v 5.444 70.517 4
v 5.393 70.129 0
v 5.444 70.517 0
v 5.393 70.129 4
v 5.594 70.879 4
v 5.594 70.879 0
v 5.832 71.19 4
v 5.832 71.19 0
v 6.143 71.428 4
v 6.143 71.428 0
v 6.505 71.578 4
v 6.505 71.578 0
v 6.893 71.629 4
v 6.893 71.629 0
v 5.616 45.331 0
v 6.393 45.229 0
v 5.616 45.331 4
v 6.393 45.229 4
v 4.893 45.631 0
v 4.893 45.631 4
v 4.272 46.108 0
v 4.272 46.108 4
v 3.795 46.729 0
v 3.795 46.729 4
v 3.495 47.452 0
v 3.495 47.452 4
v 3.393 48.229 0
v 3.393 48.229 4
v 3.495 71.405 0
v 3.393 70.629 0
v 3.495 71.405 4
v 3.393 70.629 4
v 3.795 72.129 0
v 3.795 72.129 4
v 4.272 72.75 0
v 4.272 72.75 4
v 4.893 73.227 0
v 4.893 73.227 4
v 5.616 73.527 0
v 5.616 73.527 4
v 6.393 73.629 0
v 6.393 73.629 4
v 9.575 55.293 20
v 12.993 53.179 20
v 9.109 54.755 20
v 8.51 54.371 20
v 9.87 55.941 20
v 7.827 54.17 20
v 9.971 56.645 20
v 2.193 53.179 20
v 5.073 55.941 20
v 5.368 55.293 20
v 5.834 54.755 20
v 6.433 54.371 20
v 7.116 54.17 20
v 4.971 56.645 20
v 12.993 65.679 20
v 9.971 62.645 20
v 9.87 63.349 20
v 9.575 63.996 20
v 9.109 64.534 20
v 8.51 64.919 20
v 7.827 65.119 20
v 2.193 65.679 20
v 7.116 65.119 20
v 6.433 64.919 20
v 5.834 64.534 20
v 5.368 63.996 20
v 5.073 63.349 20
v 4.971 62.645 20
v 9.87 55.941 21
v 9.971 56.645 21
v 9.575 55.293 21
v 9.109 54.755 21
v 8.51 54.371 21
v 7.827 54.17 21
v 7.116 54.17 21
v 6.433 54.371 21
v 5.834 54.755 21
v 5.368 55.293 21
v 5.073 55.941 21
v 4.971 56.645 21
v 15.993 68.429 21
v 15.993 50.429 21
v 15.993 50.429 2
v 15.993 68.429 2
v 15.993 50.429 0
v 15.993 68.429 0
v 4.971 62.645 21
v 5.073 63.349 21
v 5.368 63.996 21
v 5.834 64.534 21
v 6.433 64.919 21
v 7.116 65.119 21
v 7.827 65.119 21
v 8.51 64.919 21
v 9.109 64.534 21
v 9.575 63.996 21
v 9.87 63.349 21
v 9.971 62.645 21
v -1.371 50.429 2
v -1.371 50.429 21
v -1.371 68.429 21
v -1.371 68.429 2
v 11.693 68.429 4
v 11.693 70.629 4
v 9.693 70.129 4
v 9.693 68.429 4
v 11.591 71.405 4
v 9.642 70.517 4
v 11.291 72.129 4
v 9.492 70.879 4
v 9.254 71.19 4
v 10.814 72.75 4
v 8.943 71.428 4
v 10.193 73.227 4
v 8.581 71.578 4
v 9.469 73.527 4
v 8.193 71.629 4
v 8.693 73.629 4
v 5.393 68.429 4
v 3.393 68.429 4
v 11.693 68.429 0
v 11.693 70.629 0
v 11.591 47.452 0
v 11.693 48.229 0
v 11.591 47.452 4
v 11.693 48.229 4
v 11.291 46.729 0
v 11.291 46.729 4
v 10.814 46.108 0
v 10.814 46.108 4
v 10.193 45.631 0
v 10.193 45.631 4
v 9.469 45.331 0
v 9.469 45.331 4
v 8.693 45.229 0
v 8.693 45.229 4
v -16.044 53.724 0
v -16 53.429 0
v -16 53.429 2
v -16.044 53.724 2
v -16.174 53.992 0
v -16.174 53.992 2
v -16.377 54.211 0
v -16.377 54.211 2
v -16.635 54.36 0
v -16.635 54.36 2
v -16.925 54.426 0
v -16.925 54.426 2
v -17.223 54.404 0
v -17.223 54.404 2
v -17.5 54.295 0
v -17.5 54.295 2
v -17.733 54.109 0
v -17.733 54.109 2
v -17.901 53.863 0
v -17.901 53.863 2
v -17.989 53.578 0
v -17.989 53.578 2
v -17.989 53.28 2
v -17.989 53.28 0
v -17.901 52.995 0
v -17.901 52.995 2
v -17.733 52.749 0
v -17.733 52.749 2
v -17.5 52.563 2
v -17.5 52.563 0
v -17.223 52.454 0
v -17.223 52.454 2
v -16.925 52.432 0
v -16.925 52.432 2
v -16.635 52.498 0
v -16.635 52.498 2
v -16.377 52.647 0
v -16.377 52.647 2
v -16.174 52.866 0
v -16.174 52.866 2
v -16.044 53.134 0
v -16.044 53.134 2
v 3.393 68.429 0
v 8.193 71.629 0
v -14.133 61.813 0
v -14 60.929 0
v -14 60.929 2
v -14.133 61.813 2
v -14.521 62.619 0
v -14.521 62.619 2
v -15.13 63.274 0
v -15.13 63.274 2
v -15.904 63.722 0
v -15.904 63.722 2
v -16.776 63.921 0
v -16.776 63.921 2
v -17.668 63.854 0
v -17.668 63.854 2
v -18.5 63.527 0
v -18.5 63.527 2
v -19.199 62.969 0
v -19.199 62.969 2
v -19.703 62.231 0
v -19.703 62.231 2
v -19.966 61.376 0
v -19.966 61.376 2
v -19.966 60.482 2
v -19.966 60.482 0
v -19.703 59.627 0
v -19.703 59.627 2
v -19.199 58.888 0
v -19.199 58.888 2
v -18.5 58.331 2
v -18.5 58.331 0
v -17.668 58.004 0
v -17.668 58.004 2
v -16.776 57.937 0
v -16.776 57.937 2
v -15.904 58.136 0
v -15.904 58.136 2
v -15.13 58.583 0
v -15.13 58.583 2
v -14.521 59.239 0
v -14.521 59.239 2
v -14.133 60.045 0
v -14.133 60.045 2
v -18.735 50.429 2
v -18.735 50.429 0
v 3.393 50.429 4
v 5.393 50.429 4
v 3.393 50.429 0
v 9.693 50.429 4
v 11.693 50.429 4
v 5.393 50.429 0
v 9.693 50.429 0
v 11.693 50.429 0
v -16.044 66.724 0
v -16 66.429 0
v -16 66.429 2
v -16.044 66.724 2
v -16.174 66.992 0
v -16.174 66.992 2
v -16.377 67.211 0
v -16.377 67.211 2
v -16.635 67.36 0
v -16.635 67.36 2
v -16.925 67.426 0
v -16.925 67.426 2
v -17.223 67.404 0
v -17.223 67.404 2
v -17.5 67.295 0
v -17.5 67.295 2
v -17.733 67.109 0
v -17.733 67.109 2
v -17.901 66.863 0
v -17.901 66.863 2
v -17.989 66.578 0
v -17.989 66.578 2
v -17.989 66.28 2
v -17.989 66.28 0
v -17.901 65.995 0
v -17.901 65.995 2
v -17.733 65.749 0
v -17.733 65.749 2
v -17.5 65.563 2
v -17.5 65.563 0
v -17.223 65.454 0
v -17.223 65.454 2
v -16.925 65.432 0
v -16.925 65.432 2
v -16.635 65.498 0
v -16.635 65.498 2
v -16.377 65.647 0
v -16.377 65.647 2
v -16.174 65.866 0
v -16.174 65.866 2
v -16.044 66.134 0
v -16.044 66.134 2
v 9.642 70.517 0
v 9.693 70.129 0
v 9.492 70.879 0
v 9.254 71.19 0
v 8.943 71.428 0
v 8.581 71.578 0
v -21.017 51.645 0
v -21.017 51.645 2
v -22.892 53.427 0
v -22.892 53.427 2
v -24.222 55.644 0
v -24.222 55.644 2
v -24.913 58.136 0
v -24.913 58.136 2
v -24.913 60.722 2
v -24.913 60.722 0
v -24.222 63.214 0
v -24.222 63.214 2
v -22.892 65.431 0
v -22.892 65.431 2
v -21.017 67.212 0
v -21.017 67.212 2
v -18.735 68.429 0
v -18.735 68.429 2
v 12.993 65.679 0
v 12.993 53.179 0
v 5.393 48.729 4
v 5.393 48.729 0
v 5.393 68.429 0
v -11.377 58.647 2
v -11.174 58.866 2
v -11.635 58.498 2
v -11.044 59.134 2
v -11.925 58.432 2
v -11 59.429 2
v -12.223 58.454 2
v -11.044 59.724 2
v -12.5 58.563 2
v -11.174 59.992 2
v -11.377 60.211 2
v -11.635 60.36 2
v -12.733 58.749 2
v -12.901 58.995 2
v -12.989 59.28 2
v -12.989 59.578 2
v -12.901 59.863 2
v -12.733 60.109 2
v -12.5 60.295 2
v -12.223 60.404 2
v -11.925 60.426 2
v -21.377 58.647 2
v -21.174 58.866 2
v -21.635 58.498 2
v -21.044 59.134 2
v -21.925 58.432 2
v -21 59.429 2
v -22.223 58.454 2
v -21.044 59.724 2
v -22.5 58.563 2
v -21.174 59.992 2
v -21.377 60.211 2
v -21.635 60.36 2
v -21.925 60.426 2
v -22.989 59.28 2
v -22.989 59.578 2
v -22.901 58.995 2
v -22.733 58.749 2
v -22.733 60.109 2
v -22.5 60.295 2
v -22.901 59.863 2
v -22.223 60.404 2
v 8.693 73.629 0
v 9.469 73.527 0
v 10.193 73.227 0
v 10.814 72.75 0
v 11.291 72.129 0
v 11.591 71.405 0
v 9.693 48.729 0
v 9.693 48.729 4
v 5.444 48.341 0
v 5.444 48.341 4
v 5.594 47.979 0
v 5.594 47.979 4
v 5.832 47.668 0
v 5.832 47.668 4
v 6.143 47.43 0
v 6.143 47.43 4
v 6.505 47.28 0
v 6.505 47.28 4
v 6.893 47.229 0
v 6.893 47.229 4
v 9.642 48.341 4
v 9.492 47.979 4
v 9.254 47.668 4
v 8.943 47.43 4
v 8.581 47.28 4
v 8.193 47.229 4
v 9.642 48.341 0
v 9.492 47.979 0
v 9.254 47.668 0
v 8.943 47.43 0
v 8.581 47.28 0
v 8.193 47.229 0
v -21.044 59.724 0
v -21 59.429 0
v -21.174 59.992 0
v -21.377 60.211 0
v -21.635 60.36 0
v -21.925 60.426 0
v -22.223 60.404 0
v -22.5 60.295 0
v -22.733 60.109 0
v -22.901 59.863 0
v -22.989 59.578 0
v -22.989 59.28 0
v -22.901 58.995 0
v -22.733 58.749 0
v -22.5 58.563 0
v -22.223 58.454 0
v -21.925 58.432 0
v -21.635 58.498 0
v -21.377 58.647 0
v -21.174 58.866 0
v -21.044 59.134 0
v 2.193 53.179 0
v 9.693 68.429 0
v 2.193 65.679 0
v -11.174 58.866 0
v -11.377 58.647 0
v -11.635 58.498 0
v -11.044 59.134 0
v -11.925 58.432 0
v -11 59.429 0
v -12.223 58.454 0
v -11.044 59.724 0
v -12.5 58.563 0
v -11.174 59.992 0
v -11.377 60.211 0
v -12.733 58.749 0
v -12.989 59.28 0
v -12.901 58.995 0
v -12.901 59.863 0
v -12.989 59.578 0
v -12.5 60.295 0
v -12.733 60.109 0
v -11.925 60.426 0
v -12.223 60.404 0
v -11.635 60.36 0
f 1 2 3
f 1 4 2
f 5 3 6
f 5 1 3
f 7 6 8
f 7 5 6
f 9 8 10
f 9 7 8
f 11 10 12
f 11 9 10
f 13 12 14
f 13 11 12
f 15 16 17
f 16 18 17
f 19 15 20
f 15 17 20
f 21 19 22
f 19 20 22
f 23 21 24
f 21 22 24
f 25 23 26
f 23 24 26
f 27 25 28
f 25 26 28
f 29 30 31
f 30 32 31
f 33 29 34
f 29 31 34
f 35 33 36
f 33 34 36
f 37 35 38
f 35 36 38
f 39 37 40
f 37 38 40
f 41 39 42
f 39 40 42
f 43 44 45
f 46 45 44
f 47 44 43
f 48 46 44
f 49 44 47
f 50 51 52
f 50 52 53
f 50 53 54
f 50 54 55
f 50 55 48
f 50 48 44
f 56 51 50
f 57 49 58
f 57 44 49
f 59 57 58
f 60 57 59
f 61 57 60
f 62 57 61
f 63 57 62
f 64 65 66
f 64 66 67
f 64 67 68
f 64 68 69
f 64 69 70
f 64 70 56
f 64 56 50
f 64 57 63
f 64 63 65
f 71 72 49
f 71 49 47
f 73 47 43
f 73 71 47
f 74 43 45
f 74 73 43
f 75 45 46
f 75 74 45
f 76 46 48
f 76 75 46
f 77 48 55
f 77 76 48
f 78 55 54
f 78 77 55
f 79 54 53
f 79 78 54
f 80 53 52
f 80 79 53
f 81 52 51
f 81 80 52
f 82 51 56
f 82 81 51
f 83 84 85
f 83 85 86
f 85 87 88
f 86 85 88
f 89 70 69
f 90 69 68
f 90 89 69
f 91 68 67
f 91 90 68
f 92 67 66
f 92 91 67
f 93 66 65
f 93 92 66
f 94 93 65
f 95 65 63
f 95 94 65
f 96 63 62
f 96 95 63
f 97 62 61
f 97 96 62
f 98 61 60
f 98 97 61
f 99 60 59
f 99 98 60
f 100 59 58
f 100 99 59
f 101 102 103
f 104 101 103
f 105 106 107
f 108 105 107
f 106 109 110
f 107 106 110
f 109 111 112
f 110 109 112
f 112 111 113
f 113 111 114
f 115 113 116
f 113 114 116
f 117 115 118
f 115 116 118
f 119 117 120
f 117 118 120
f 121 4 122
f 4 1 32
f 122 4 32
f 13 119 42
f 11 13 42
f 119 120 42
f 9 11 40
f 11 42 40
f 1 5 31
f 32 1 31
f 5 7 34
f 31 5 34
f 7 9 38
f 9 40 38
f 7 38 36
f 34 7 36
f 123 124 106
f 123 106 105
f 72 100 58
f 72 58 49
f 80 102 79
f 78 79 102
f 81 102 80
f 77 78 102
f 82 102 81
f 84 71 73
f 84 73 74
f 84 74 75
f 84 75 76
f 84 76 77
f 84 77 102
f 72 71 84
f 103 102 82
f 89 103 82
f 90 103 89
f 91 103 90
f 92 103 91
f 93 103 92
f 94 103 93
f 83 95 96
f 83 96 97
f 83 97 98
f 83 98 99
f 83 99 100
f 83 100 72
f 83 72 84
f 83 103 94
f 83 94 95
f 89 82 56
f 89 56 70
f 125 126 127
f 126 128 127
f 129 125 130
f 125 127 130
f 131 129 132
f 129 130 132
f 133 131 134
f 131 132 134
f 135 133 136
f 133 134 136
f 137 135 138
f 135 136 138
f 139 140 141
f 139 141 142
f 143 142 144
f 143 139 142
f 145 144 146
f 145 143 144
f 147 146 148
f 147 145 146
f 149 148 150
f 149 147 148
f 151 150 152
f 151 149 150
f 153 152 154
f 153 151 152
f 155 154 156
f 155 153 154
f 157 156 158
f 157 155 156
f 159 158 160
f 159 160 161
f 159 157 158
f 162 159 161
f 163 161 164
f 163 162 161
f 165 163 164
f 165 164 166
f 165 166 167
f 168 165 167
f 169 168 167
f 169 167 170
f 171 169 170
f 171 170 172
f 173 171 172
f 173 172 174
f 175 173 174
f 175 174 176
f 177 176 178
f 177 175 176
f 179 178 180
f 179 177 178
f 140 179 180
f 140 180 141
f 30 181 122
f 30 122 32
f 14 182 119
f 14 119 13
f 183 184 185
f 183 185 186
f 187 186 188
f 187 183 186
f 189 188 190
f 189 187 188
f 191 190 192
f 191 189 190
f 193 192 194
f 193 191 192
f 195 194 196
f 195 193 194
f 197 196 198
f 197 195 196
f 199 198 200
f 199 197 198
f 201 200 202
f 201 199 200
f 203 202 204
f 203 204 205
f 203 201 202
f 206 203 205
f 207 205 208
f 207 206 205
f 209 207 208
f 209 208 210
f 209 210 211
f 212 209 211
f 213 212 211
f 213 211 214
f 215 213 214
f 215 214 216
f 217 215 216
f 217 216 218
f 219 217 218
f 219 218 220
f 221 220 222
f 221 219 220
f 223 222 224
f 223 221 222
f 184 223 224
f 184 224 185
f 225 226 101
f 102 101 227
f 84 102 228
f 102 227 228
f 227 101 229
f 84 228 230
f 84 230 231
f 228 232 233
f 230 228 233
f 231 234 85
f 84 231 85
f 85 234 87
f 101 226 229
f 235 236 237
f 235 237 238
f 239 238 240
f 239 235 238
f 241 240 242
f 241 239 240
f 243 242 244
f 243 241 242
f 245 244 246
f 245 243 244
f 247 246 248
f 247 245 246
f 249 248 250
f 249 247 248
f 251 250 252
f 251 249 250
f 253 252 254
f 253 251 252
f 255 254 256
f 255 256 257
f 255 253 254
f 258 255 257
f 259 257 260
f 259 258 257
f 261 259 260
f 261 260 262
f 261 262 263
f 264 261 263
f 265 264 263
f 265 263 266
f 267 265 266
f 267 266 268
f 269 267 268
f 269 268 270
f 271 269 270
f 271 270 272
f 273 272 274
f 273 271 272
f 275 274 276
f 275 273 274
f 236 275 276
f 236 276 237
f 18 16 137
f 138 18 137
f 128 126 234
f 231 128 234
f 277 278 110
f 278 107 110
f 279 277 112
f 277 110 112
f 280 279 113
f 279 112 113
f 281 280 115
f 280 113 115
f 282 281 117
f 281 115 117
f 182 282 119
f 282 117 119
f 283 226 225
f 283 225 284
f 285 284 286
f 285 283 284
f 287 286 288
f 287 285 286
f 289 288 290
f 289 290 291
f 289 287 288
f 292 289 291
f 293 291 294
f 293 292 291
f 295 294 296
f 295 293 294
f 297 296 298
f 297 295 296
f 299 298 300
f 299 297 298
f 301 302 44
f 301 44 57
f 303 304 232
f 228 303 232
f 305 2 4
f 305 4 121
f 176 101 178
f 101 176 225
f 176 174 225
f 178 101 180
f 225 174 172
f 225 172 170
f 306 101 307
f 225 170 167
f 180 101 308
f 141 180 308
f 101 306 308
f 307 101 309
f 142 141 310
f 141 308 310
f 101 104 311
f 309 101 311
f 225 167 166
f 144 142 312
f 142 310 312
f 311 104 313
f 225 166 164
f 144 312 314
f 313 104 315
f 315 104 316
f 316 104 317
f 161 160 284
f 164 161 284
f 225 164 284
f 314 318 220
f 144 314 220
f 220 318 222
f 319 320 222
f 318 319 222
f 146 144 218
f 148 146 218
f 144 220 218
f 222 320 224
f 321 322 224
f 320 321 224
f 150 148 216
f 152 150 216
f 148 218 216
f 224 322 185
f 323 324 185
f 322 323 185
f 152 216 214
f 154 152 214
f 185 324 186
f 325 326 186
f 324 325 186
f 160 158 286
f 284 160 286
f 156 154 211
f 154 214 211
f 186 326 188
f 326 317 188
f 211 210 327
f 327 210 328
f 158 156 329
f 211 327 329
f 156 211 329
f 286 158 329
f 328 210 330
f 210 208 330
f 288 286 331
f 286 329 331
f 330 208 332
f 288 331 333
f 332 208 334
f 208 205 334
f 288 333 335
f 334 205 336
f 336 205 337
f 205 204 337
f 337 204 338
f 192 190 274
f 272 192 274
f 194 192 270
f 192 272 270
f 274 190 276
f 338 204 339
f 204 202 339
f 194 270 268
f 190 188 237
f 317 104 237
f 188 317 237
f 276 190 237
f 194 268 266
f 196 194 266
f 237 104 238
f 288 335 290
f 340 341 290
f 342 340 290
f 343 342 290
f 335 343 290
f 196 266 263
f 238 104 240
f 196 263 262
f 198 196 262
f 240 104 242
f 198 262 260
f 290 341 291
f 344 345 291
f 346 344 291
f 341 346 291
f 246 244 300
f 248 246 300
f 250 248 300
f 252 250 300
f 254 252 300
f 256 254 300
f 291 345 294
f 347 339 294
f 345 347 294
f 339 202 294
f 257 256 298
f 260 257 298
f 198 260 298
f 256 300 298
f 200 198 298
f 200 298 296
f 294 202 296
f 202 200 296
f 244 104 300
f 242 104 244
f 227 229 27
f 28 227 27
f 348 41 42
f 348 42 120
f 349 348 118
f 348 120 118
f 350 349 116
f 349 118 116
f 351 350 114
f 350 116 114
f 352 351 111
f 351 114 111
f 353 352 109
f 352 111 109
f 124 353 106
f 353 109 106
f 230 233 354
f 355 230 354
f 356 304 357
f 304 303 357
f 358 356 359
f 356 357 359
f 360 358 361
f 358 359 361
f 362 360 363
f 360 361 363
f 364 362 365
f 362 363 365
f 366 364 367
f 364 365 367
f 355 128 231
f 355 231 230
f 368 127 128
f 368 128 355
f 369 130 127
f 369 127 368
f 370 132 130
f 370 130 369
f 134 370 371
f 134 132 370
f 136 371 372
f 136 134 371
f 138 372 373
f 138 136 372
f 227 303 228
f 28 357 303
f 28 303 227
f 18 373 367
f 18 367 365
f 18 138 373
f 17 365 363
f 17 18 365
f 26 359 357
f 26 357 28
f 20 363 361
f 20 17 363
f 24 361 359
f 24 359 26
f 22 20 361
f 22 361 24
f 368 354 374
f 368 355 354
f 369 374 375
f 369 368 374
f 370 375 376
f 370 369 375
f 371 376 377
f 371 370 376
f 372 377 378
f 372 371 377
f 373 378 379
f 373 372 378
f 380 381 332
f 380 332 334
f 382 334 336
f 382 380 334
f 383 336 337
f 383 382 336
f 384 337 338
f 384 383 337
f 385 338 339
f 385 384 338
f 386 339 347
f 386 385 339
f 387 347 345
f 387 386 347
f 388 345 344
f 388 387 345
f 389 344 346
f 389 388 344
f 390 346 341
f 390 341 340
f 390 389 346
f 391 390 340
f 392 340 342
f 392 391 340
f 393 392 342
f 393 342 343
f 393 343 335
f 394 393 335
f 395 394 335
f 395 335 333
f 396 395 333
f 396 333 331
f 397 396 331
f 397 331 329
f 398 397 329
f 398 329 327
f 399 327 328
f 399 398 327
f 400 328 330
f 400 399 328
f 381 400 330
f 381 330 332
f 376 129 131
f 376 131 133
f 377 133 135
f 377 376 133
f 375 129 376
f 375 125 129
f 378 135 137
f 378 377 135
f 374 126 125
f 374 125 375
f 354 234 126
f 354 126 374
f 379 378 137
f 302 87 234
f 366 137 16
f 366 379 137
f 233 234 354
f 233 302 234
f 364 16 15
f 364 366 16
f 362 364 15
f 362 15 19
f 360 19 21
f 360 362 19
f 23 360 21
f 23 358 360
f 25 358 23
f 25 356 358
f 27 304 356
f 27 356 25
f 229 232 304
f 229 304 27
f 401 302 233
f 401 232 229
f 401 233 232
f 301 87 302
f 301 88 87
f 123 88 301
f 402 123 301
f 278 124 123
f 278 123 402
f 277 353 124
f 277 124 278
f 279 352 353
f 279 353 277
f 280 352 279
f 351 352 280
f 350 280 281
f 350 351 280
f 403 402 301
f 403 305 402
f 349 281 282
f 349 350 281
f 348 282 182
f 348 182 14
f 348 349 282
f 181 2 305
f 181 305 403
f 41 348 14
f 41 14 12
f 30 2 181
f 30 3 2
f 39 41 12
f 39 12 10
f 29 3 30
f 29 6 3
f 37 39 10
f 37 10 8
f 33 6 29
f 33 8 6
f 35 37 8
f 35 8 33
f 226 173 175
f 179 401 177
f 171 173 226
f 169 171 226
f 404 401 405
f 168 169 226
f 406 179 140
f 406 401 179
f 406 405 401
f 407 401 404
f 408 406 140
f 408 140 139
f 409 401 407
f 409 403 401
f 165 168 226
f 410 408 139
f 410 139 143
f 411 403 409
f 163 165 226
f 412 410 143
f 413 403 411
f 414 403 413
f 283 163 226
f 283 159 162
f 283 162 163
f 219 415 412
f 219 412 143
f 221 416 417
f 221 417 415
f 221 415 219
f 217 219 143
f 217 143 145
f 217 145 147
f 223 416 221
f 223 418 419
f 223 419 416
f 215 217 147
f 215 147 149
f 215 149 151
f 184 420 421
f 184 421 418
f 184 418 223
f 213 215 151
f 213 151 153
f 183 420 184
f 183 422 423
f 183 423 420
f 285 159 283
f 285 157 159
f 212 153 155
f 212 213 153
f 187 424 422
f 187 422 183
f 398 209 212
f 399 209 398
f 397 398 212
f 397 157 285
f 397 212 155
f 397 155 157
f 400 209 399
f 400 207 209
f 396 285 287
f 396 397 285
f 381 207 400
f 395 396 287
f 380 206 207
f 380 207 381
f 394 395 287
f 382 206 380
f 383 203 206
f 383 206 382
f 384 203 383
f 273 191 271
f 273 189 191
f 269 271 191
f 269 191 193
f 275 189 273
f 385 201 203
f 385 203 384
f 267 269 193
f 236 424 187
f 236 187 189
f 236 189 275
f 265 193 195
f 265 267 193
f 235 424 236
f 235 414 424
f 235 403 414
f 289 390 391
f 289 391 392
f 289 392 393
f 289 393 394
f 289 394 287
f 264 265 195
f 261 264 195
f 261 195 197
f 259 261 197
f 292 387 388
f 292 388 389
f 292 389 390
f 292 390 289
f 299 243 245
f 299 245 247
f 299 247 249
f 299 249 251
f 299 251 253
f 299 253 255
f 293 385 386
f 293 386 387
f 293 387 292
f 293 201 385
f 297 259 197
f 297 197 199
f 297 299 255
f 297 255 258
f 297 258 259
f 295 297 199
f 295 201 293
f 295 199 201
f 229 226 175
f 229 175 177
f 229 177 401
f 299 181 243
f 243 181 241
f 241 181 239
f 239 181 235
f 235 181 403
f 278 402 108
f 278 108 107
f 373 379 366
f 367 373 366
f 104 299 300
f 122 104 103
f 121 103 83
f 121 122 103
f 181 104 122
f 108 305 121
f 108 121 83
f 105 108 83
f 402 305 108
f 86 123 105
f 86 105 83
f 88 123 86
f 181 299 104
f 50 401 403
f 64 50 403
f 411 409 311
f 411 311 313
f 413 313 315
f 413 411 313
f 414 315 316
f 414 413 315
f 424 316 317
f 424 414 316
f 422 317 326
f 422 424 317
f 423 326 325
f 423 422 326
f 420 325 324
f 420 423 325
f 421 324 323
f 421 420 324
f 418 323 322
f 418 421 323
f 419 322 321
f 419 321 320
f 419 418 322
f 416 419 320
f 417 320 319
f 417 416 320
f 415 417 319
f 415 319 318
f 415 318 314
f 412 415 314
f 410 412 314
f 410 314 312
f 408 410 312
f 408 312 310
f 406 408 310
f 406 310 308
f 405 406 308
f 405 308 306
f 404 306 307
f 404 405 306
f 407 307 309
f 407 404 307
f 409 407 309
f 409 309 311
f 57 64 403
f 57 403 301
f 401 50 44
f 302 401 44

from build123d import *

# Parameters (mm, degrees)
SKETCH2_R            = 1
SKETCH2_R_2          = 3
BOSS_EXTRUDE2_DEPTH  = 2
SKETCH3_W            = 10.8
SKETCH3_H            = 12.5
CUT_EXTRUDE1_DEPTH   = 3
SKETCH4_W            = 17.364181201
SKETCH4_H            = 18
BOSS_EXTRUDE3_DEPTH  = 19
SKETCH5_W            = 10.8
SKETCH5_H            = 12.5
CUT_EXTRUDE2_DEPTH   = 18
BOSS_EXTRUDE4_DEPTH  = 4
FILLET1_R            = 1.5
FILLET2_R            = 3
FILLET1_OF_MIRROR1_R = 1.5
FILLET2_OF_MIRROR1_R = 3
CUT_EXTRUDE3_DEPTH   = 10


with BuildPart() as part:
    # Sketch2 → Boss-Extrude2 (new body)
    with BuildSketch(Plane.XY):
        with BuildLine():
            Line((-18.735484911, 68.428926153), (15.992877491, 68.428926153))
            Line((15.992877491, 68.428926153), (15.992877491, 50.428926153))
            Line((15.992877491, 50.428926153), (-18.735484911, 50.428926153))
            ThreePointArc((-18.735484911, 50.428926153), (-25.000050177, 59.428926153), (-18.735484911, 68.428926153))
        make_face()
        with Locations((-17, 53.428926153)):
            Circle(SKETCH2_R, mode=Mode.SUBTRACT)
        with Locations((-17, 60.928926153)):
            Circle(SKETCH2_R_2, mode=Mode.SUBTRACT)
        with Locations((-22, 59.428926153)):
            Circle(SKETCH2_R, mode=Mode.SUBTRACT)
        with Locations((-17, 66.428926153)):
            Circle(SKETCH2_R, mode=Mode.SUBTRACT)
        with Locations((-12, 59.428926153)):
            Circle(SKETCH2_R, mode=Mode.SUBTRACT)
    extrude(amount=BOSS_EXTRUDE2_DEPTH)

    # Sketch3 → Cut-Extrude1 (cut, through all)
    with BuildSketch(Plane.XY.offset(2)):
        with Locations((7.592877491, 59.428926153)):
            Rectangle(SKETCH3_W, SKETCH3_H)
    extrude(amount=-CUT_EXTRUDE1_DEPTH, mode=Mode.SUBTRACT)

    # Sketch4 → Boss-Extrude3 (add)
    with BuildSketch(Plane.XY.offset(2)):
        with Locations((7.310786891, 59.428926153)):
            Rectangle(SKETCH4_W, SKETCH4_H)
    extrude(amount=BOSS_EXTRUDE3_DEPTH)

    # Sketch5 → Cut-Extrude2 (cut)
    with BuildSketch(Plane(origin=(0, 0, 2), x_dir=(-1, 0, 0), z_dir=(0, 0, -1))):
        with Locations((-7.592877491, 59.428926153)):
            Rectangle(SKETCH5_W, SKETCH5_H)
    extrude(amount=-CUT_EXTRUDE2_DEPTH, mode=Mode.SUBTRACT)

    # Sketch7 → Boss-Extrude4 (add)
    with BuildSketch(Plane(origin=(0, 0, 0), x_dir=(-1, 0, 0), z_dir=(0, 0, -1))):
        Polygon((-11.692877491, 68.428926153), (-9.692877491, 68.428926153), (-9.692877491, 71.628926153), (-5.392877491, 71.628926153), (-5.392877491, 68.428926153), (-3.392877491, 68.428926153), (-3.392877491, 73.628926153), (-11.692877491, 73.628926153), align=None)
    boss_extrude4 = extrude(amount=-BOSS_EXTRUDE4_DEPTH)

    # Fillet1
    fillet1_edges = [part.edges().sort_by_distance(p)[0] for p in [
        (5.392877491, 71.628926153, 2),
        (9.692877491, 71.628926153, 2),
    ]]
    fillet(fillet1_edges, radius=FILLET1_R)

    # Fillet2
    fillet2_edges = [part.edges().sort_by_distance(p)[0] for p in [
        (3.392877491, 73.628926153, 2),
        (11.692877491, 73.628926153, 2),
    ]]
    fillet(fillet2_edges, radius=FILLET2_R)

    # Mirror1: Boss-Extrude4 across plane
    add(boss_extrude4.mirror(Plane.ZX.offset(59.428926153)))

    # Fillet1 of Mirror1
    fillet1_of_mirror1_edges = [part.edges().sort_by_distance(p)[0] for p in [
        (5.392877491, 47.228926153, 2),
        (9.692877491, 47.228926153, 2),
    ]]
    fillet(fillet1_of_mirror1_edges, radius=FILLET1_OF_MIRROR1_R)

    # Fillet2 of Mirror1
    fillet2_of_mirror1_edges = [part.edges().sort_by_distance(p)[0] for p in [
        (3.392877491, 45.228926153, 2),
        (11.692877491, 45.228926153, 2),
    ]]
    fillet(fillet2_of_mirror1_edges, radius=FILLET2_OF_MIRROR1_R)

    # Sketch9 → Cut-Extrude3 (cut)
    with BuildSketch(Plane.XY.offset(21)):
        with BuildLine():
            Line((9.971454774, 62.64486165), (9.971454774, 56.64486165))
            ThreePointArc((9.971454774, 56.64486165), (7.471454774, 54.14486165), (4.971454774, 56.64486165))
            Line((4.971454774, 56.64486165), (4.971454774, 62.64486165))
            ThreePointArc((4.971454774, 62.64486165), (7.471454774, 65.14486165), (9.971454774, 62.64486165))
        make_face()
    extrude(amount=-CUT_EXTRUDE3_DEPTH, mode=Mode.SUBTRACT)


solid = part.part
